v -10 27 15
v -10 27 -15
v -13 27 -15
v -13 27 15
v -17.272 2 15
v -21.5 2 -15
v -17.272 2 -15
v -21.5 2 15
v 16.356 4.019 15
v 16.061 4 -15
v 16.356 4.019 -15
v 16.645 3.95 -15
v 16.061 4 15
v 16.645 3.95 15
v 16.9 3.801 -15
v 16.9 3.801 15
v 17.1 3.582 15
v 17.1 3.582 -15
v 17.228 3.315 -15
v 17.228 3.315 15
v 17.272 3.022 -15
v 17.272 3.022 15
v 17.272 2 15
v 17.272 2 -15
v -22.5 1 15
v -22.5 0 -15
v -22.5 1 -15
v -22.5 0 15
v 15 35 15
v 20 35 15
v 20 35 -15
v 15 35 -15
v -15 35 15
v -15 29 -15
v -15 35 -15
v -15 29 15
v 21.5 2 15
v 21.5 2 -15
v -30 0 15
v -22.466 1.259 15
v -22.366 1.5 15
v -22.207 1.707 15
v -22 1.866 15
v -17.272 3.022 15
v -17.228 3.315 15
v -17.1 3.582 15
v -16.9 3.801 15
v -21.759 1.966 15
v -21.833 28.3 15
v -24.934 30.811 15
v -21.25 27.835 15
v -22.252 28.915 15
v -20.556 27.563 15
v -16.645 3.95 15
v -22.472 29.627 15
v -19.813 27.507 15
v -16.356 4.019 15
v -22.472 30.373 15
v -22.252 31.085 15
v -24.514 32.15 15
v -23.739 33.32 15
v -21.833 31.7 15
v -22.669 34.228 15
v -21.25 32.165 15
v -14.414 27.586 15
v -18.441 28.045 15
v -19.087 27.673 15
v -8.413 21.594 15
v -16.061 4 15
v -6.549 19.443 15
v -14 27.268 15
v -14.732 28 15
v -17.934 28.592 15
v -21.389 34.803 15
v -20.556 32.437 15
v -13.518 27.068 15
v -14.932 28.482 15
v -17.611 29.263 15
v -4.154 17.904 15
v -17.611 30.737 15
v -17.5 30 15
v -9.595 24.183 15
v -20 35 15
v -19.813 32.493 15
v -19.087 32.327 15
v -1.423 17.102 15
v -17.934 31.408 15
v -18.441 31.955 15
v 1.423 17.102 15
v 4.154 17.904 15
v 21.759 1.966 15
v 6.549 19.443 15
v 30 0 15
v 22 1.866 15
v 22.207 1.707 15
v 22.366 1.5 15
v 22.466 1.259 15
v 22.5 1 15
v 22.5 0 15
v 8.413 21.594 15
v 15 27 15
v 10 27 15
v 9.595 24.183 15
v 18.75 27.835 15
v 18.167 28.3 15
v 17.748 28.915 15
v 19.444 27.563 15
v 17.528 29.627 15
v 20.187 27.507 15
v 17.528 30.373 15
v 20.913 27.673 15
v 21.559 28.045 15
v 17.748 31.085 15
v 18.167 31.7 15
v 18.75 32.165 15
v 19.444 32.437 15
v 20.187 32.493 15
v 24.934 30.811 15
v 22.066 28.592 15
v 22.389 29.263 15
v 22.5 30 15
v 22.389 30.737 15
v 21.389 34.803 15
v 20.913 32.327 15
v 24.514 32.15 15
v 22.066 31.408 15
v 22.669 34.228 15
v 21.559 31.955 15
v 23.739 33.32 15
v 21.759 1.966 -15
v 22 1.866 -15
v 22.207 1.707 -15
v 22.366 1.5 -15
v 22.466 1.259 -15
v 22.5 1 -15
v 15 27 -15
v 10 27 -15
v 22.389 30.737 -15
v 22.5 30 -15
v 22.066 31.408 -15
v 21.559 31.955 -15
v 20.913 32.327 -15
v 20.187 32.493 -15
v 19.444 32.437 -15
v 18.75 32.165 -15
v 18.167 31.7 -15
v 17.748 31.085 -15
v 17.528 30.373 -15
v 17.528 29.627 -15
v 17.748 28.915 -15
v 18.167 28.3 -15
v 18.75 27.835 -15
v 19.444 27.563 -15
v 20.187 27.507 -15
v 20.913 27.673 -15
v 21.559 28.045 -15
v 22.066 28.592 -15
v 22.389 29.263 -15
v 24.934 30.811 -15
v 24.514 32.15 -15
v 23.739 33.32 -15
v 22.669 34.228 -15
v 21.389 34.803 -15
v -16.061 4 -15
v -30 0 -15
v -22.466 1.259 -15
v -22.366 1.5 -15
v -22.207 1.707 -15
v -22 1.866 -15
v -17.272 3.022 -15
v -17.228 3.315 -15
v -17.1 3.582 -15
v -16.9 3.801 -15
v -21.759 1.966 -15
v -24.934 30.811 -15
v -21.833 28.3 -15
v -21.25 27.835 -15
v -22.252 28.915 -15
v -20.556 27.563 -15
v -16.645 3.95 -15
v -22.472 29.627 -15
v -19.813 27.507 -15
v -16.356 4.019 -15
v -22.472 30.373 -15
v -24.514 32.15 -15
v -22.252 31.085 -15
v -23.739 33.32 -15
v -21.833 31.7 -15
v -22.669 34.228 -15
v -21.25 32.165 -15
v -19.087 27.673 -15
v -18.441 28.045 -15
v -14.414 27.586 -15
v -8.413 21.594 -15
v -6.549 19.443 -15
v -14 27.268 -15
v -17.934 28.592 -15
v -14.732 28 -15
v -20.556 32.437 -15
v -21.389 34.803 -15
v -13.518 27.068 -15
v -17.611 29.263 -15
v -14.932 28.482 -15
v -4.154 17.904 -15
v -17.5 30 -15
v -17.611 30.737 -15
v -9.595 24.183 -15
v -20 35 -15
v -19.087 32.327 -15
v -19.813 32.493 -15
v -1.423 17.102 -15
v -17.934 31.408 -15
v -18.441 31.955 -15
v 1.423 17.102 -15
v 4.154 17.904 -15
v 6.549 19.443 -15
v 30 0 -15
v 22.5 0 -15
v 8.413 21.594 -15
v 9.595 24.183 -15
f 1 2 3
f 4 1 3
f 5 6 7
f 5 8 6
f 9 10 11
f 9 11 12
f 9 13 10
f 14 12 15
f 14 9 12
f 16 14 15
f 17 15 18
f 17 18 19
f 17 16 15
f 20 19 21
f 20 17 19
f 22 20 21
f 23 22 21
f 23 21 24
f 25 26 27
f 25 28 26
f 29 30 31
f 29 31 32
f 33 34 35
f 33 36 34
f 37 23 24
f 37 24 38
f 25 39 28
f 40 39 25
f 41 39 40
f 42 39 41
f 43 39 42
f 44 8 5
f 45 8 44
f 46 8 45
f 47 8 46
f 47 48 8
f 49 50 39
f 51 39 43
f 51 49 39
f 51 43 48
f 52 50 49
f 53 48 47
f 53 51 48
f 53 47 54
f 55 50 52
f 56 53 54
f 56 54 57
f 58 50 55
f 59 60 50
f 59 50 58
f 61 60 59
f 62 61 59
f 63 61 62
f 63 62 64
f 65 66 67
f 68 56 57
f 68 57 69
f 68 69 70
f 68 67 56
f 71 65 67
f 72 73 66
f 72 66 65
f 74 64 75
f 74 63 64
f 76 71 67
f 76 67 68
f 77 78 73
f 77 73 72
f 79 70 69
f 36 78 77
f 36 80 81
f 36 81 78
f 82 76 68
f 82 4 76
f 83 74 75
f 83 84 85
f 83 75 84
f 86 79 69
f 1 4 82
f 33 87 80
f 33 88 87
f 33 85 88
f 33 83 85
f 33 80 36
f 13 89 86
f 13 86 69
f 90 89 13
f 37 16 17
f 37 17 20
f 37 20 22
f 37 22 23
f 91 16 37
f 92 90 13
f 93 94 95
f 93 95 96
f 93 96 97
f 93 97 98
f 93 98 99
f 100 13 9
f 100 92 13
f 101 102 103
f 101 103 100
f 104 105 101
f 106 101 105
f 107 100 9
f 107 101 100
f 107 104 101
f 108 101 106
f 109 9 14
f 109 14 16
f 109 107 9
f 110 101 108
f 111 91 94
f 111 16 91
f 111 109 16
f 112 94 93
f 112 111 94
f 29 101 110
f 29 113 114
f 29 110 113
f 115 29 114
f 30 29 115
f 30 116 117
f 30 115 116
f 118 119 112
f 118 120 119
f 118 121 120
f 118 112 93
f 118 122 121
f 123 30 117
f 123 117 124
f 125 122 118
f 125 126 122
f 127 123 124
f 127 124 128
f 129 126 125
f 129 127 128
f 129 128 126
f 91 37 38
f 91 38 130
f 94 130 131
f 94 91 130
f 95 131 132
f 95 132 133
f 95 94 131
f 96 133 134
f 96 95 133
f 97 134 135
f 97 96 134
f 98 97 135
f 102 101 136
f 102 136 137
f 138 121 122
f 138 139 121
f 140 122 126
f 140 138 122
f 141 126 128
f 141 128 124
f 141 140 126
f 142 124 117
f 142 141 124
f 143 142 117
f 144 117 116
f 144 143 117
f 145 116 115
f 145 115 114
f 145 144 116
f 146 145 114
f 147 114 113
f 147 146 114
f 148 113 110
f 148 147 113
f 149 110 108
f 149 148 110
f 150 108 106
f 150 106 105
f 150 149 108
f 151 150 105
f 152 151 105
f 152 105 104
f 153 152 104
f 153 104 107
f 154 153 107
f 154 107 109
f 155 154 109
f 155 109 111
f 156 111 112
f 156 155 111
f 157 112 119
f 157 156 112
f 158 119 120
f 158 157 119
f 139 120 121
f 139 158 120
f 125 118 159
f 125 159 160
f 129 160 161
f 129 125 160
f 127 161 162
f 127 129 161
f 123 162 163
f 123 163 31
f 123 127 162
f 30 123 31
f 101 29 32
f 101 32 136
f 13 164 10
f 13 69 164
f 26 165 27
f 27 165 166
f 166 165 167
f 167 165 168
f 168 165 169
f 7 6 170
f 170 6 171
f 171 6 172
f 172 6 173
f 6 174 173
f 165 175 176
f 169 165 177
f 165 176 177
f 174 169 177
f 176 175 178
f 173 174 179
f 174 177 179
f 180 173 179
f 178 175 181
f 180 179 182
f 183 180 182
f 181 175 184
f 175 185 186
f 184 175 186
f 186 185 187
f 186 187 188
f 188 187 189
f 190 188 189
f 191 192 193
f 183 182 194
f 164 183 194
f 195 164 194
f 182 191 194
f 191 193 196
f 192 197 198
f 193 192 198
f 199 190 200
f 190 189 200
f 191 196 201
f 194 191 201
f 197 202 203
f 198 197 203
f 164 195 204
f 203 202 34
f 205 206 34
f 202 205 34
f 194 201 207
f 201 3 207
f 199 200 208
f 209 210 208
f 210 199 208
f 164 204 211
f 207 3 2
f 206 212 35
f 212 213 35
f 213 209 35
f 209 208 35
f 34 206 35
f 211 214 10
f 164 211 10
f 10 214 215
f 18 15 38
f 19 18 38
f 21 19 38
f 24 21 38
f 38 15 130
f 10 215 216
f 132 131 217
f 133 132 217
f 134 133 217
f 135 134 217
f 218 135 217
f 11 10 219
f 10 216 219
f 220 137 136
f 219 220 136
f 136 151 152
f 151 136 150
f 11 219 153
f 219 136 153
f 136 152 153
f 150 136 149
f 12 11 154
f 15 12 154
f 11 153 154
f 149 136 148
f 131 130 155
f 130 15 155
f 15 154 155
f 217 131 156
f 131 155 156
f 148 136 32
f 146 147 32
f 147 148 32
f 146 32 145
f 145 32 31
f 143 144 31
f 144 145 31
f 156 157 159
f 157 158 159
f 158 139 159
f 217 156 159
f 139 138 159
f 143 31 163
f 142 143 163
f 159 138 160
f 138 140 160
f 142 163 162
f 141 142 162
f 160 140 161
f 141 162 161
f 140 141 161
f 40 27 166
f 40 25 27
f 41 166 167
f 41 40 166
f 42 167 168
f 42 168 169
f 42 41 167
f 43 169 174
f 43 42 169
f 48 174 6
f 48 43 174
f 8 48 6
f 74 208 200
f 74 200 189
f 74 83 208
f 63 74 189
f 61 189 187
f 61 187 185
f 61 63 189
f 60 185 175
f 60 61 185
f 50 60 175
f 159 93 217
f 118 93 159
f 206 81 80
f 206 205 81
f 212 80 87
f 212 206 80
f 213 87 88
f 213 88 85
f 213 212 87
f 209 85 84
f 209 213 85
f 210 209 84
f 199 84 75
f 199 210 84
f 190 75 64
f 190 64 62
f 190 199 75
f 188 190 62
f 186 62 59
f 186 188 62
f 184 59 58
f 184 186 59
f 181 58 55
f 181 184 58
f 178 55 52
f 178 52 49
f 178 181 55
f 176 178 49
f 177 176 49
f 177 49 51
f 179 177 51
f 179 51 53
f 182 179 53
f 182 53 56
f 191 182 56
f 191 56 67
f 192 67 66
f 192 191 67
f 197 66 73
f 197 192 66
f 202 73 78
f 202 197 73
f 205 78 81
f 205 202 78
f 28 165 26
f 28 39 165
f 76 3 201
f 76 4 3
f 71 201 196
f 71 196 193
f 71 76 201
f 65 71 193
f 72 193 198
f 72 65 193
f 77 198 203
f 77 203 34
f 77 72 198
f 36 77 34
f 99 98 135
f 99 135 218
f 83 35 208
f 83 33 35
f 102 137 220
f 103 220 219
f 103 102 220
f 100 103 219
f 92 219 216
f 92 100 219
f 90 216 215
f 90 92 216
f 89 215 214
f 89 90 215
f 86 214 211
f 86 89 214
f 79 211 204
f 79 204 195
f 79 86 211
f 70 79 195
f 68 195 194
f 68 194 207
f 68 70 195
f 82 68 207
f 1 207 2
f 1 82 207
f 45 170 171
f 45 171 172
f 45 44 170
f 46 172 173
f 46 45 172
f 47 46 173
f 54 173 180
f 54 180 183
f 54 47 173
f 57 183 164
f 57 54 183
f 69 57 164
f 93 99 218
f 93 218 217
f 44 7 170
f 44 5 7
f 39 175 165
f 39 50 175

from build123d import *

# Parameters (mm, degrees)
SKETCH1_R           = 2.5
BOSS_EXTRUDE1_DEPTH = 15


with BuildPart() as part:
    # Sketch1 → Boss-Extrude1 (new, symmetric)
    with BuildSketch(Plane.XY):
        with BuildLine():
            ThreePointArc((16.060946061, 4), (16.899910262, 3.800538423), (17.271733188, 3.022468012))
            Line((17.271733188, 3.022468012), (17.271733188, 2))
            Line((17.271733188, 2), (21.5, 2))
            ThreePointArc((21.5, 2), (22.207106781, 1.707106781), (22.5, 1))
            Line((22.5, 1), (22.5, 0))
            Line((22.5, 0), (30, 0))
            Line((30, 0), (24.933748499, 30.8112495))
            ThreePointArc((24.933748499, 30.8112495), (23.236027851, 33.811577593), (20, 35))
            Line((20, 35), (15, 35))
            Line((15, 35), (15, 29))
            Line((15, 29), (15, 27))
            Line((15, 27), (13, 27))
            Line((13, 27), (10, 27))
            ThreePointArc((10, 27), (0, 17), (-10, 27))
            Line((-10, 27), (-13, 27))
            ThreePointArc((-13, 27), (-14.414213562, 27.585786438), (-15, 29))
            Line((-15, 29), (-15, 35))
            Line((-15, 35), (-20, 35))
            ThreePointArc((-20, 35), (-23.236027851, 33.811577593), (-24.933748499, 30.8112495))
            Line((-24.933748499, 30.8112495), (-30, 0))
            Line((-30, 0), (-22.5, 0))
            Line((-22.5, 0), (-22.5, 1))
            ThreePointArc((-22.5, 1), (-22.207106781, 1.707106781), (-21.5, 2))
            Line((-21.5, 2), (-17.271733188, 2))
            Line((-17.271733188, 2), (-17.271733188, 3.022468012))
            ThreePointArc((-17.271733188, 3.022468012), (-16.899910262, 3.800538423), (-16.060946061, 4))
            Line((-16.060946061, 4), (16.060946061, 4))
        make_face()
        with Locations((-20, 30)):
            Circle(SKETCH1_R, mode=Mode.SUBTRACT)
        with Locations((20, 30)):
            Circle(SKETCH1_R, mode=Mode.SUBTRACT)
    extrude(amount=BOSS_EXTRUDE1_DEPTH, both=True)


solid = part.part
